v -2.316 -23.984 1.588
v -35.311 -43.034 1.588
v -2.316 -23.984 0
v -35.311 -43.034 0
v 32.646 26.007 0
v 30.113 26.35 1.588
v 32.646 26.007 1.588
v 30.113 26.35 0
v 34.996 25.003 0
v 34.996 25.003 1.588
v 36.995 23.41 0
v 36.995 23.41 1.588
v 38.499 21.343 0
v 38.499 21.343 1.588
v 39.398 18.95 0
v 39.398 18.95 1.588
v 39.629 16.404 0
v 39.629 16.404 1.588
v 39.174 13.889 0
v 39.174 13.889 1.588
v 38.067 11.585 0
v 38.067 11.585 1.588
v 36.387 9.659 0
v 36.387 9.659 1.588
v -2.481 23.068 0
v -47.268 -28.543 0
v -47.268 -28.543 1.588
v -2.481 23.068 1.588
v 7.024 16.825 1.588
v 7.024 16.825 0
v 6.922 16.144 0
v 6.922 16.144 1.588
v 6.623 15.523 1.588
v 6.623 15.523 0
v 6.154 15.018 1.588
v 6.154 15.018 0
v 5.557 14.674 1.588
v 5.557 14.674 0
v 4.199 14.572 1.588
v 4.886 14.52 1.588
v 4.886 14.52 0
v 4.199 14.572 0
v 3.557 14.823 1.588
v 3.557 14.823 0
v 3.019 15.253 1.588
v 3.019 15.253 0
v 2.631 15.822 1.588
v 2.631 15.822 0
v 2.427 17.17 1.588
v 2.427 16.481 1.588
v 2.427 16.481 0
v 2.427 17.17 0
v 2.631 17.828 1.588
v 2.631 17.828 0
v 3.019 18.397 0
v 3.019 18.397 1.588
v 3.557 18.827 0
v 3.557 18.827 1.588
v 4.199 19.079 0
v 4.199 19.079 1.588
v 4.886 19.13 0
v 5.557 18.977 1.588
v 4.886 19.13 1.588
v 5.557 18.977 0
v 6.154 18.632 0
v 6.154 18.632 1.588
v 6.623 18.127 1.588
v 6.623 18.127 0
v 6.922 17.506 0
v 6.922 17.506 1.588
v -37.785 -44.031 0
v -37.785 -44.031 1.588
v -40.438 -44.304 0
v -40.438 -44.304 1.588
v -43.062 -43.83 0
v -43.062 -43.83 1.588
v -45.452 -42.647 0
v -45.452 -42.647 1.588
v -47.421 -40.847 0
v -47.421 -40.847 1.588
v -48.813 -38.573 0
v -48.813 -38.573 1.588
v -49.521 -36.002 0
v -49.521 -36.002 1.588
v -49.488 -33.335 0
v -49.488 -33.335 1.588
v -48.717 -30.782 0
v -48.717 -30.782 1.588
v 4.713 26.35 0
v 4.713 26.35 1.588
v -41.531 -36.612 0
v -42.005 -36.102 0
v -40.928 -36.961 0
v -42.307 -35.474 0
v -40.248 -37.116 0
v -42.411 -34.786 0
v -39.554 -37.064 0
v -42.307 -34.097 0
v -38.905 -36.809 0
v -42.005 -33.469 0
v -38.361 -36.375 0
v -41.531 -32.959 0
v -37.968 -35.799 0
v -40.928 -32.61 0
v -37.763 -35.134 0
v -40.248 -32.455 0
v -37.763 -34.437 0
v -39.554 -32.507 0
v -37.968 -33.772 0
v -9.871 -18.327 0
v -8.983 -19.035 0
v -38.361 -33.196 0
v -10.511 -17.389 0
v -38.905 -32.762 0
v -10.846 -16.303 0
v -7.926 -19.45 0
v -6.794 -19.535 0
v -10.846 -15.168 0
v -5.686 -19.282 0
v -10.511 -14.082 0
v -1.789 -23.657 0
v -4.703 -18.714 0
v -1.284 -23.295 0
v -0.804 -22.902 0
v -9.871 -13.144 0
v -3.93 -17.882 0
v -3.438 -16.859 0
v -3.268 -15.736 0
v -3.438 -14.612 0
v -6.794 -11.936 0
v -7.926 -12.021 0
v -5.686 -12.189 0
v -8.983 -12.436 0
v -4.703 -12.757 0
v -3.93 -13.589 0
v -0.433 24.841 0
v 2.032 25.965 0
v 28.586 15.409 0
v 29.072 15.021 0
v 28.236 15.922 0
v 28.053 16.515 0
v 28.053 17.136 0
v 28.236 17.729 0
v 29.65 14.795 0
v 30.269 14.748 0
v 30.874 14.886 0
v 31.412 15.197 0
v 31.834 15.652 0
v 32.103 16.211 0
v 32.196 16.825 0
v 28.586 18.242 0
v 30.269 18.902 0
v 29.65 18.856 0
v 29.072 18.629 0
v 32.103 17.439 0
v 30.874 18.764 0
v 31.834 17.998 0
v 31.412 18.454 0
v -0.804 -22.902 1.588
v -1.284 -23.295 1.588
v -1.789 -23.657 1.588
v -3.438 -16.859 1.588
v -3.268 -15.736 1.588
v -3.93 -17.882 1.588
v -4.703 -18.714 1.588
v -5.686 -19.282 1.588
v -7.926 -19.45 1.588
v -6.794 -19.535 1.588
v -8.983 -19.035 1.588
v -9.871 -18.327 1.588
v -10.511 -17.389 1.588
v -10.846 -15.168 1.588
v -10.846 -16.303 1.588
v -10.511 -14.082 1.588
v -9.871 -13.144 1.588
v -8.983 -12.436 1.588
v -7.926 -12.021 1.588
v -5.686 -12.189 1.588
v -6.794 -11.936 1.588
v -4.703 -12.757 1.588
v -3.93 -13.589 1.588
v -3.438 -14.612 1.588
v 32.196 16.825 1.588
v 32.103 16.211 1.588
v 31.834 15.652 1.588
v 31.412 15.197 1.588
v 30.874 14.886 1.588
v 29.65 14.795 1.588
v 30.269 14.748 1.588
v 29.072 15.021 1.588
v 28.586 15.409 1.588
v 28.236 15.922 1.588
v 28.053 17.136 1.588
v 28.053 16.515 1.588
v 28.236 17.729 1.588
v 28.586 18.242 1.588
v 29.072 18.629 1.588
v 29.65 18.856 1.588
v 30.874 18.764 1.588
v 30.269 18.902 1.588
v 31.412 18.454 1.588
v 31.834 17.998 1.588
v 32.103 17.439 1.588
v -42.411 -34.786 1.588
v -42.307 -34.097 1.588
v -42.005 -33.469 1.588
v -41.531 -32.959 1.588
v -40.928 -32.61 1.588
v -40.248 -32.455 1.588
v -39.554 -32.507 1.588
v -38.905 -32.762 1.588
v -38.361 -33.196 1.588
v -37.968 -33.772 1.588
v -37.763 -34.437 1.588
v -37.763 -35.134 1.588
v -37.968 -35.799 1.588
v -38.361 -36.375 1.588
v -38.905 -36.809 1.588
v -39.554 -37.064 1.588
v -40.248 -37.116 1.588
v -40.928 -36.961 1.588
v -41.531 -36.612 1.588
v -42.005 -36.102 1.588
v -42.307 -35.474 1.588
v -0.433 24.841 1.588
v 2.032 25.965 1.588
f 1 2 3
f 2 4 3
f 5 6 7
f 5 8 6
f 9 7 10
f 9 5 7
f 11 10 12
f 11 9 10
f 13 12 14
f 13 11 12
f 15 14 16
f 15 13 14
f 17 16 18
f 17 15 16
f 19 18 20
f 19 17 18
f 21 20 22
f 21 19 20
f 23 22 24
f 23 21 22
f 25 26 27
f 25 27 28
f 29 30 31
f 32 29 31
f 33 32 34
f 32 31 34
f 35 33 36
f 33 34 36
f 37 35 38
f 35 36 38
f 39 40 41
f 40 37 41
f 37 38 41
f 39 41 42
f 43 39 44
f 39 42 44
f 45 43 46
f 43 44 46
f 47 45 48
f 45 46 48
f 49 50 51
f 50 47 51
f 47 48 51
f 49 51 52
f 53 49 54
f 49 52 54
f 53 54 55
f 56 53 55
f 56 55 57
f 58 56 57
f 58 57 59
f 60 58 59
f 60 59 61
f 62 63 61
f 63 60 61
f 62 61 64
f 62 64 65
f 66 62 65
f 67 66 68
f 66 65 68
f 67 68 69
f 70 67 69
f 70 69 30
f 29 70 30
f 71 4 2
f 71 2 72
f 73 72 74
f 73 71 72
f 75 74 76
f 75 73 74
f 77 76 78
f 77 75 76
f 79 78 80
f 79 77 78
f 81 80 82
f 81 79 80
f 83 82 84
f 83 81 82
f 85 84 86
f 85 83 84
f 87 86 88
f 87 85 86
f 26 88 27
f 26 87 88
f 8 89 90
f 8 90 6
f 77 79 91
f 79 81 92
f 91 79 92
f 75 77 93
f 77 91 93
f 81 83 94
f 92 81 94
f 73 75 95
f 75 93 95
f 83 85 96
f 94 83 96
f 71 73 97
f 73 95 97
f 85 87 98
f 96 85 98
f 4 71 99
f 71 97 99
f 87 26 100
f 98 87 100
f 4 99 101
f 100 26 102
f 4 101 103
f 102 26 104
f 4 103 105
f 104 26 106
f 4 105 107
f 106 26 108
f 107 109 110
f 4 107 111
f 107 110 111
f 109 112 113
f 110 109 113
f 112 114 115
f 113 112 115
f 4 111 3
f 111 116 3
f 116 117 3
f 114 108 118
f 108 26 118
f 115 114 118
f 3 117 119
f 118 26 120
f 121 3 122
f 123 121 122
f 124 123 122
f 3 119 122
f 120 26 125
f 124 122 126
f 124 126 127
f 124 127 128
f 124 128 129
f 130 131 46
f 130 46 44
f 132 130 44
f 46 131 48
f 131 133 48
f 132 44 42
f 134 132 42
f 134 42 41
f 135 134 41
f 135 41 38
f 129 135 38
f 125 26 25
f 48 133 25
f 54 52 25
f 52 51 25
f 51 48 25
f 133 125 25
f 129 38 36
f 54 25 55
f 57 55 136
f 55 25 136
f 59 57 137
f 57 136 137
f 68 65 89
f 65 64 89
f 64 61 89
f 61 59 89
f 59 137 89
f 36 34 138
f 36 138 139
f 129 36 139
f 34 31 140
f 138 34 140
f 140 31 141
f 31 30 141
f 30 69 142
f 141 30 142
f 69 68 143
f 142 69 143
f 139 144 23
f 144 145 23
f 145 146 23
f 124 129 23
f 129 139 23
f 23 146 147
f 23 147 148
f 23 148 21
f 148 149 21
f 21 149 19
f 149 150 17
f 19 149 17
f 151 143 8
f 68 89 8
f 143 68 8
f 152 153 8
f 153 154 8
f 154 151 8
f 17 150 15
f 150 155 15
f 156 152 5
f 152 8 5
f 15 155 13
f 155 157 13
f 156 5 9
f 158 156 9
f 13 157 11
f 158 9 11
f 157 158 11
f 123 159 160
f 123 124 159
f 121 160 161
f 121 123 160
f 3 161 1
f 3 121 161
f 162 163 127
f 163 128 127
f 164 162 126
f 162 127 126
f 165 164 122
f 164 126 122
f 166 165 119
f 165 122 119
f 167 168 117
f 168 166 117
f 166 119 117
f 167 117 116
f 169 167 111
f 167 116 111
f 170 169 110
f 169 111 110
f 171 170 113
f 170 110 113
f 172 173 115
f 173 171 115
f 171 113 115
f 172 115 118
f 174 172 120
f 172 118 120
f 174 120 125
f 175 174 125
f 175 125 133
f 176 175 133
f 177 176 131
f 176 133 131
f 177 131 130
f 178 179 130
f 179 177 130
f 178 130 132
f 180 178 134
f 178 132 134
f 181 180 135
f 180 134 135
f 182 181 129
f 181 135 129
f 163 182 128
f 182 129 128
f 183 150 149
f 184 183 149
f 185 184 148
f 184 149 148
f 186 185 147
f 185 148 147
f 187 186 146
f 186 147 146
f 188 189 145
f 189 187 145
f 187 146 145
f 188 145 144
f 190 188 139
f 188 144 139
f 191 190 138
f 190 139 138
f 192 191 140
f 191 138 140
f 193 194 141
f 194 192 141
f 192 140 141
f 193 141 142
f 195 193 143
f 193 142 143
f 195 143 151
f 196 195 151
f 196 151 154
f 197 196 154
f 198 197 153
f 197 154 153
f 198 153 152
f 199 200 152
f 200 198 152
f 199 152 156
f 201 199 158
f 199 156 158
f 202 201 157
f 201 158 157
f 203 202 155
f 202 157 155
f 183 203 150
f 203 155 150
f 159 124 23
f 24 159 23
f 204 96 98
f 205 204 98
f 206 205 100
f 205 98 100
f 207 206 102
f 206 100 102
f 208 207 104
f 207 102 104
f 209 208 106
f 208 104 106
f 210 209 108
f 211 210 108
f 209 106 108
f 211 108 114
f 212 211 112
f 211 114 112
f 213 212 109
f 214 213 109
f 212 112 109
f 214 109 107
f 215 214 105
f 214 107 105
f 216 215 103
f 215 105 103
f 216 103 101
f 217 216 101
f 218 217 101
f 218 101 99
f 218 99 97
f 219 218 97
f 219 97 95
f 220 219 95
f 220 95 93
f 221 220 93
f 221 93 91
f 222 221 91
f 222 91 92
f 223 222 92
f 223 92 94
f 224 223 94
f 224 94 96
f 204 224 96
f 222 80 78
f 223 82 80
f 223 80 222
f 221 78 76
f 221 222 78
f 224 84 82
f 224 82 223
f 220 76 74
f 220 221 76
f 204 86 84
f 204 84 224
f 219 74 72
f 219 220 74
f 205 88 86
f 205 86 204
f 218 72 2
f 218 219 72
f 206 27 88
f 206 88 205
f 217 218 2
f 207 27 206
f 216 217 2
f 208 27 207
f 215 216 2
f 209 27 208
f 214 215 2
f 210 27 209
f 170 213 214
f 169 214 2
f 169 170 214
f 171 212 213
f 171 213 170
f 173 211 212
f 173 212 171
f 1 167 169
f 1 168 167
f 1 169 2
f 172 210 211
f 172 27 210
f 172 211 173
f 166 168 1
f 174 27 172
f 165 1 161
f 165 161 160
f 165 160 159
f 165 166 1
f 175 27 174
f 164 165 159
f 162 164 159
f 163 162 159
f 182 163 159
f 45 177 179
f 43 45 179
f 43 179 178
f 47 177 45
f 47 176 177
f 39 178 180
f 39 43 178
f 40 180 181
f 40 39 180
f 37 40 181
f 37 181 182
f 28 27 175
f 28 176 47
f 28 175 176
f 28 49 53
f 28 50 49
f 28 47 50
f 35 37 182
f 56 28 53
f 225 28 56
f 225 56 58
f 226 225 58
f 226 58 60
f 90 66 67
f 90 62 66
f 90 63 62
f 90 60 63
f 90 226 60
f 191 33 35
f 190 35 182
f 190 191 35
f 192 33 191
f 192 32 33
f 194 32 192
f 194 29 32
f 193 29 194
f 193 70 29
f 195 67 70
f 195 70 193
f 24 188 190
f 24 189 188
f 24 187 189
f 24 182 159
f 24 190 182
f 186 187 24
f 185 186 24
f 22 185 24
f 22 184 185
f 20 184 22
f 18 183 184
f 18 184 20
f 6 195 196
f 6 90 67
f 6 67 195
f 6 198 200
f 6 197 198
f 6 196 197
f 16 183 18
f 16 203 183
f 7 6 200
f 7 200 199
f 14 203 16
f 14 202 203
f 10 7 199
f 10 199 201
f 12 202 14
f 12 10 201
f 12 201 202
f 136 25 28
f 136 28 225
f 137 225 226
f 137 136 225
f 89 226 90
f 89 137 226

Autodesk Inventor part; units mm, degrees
ref_plane "YZ Plane" through (0, 0, 0) normal (1, 0, 0) x (0, 1, 0)
ref_plane "XZ Plane" through (0, 0, 0) normal (0, 1, 0) x (-1, 0, 0)
sketch "Sketch1" plane through (0, 0, 0) normal (0, 0, 1) x (1, 0, 0)
  circle A0 centre (-39.737, 23.1752) radius 3 construction
  circle A1 centre (-39.737, 23.1752) radius 19.05 construction
  circle A2 centre (-7.0783, -15.7355) radius 31.75 construction
  line L0 (-66.3054, -3.825) -> (-66.3054, -14.1122) construction
  line L1 (-66.3054, -14.1122) -> (-40.9054, -14.1122) construction
  line L2 (-40.9054, -14.1122) -> (-40.9054, -3.825) construction
  line L3 (-40.9054, -3.825) -> (-66.3054, -3.825) construction
  circle A3 centre (-7.0783, -15.7355) radius 3.81
  line L4 (-7.0783, -15.7355) -> (-33.4747, -30.9755) construction
  circle A4 centre (-18.0768, -22.0855) radius 2.3368
  circle A5 centre (-29.0753, -28.4355) radius 2.3368
  circle A6 centre (4.713, 16.8252) radius 9.525
  circle A7 centre (30.113, 16.8252) radius 9.525
  circle A8 centre (-29.0753, -28.4355) radius 9.525
  circle A9 centre (-7.0783, -15.7355) radius 9.525
  line L5 (-37.7116, -24.0819) -> (-2.9197, 22.5233)
  line L6 (-24.3128, -36.6844) -> (-2.3158, -23.9844)
  line L7 (-0.804, -22.9021) -> (36.3873, 9.6587)
  line L8 (4.713, 26.3502) -> (30.113, 26.3502)
  circle A10 centre (4.713, 16.8252) radius 2.3114
  circle A11 centre (30.113, 16.8252) radius 2.0828
  point P0 (0, 0)
  point P1 (-36.708, -22.7375)
  point P2 (4.713, 26.3502)
  dimension "d1" = 63.5
  dimension "d0" = 38.1
  dimension "d2" = 25.4
  dimension "d4" = 30.48
  dimension "d5" = 4.6736
  dimension "d6" = 4.6736
  dimension "d7" = 150
  dimension "d8" = 12.7
  dimension "d9" = 12.7
  dimension "d10" = 19.05
  dimension "d11" = 19.05
  dimension "d12" = 19.05
  dimension "d13" = 19.05
ref_plane "Work Plane1" through (0, 0, 0) normal (0, 0, -1) x (-1, 0, 0)
extrude "Extrusion2" add sketch "Sketch1" along normal blind 1.5875
sketch "Sketch3" plane through (0, 0, 0) normal (0, 0, -1) x (-1, 0, 0)
  circle A0 centre (7.0783, -15.7355) radius 3.81 construction
  circle A1 centre (7.0783, -15.7355) radius 32.8018 construction
  circle A2 centre (29.0753, -28.4355) radius 2.3368 construction
  circle A3 centre (29.0753, -28.4355) radius 2.3368 construction
  circle A4 centre (18.0768, -22.0855) radius 2.3368 construction
  circle A5 centre (18.0768, -22.0855) radius 2.3368 construction
  line L0 (18.0768, -22.0855) -> (29.0753, -28.4355) construction
  line L1 (29.0753, -28.4355) -> (40.0738, -34.7855) construction
  circle A6 centre (40.0738, -34.7855) radius 2.3368
  circle A7 centre (40.0738, -34.7855) radius 9.525
  circle A8 centre (-4.713, 16.8252) radius 2.3114 projected
  circle A9 centre (-4.713, 16.8252) radius 9.525
  circle A10 centre (7.0783, -15.7355) radius 9.525
  line L2 (35.3113, -43.0344) -> (2.3158, -23.9844)
  line L3 (47.2678, -28.5428) -> (2.4809, 23.068)
  arc A11 (2.9197, 22.5233) -> (-4.713, 26.3502) centre (-4.713, 16.8252) ccw projected
  line L4 (-30.113, 26.3502) -> (-4.713, 26.3502) projected
  arc A12 (-30.113, 26.3502) -> (-36.3873, 9.6587) centre (-30.113, 16.8252) ccw projected
  line L5 (0.804, -22.9021) -> (-36.3873, 9.6587) projected
  arc A13 (0.804, -22.9021) -> (2.3158, -23.9844) centre (7.0783, -15.7355) ccw projected
  line L6 (24.3128, -36.6844) -> (2.3158, -23.9844) projected
  arc A14 (24.3128, -36.6844) -> (36.708, -22.7375) centre (29.0753, -28.4355) ccw projected
  line L7 (2.9197, 22.5233) -> (36.708, -22.7375) projected
  circle A15 centre (-30.113, 16.8252) radius 2.0828 projected
  circle A16 centre (7.0783, -15.7355) radius 3.81 projected
  circle A17 centre (29.0753, -28.4355) radius 2.3368 projected
  circle A18 centre (-4.713, 16.8252) radius 2.3114 projected
  circle A19 centre (18.0768, -22.0855) radius 2.3368 projected
  point P0 (0, 0)
  point P1 (2.9197, 22.5233)
  dimension "d21" = 19.05
  dimension "d22" = 19.05
  dimension "d18" = 12.7
  dimension "d19" = 4.6736
  dimension "d20" = 19.05
extrude "Extrusion3" add sketch "Sketch3" against normal blind 1.5875 contours A7 A14 | A7 A14 L7 A9 L3 | L2 A14 A7 picked at (41.1437, -29.5718)
sketch "Sketch4" plane through (0, 0, 1.5875) normal (0, 0, 1) x (1, 0, 0)
  circle A0 centre (-29.0753, -28.4355) radius 2.3368 projected
  circle A1 centre (-18.0768, -22.0855) radius 2.3368 projected
  point P0 (0, 0)
extrude "Extrusion4" add sketch "Sketch4" against normal up to surface (1.5875 mm away)
properties part number "intakeMotor"
